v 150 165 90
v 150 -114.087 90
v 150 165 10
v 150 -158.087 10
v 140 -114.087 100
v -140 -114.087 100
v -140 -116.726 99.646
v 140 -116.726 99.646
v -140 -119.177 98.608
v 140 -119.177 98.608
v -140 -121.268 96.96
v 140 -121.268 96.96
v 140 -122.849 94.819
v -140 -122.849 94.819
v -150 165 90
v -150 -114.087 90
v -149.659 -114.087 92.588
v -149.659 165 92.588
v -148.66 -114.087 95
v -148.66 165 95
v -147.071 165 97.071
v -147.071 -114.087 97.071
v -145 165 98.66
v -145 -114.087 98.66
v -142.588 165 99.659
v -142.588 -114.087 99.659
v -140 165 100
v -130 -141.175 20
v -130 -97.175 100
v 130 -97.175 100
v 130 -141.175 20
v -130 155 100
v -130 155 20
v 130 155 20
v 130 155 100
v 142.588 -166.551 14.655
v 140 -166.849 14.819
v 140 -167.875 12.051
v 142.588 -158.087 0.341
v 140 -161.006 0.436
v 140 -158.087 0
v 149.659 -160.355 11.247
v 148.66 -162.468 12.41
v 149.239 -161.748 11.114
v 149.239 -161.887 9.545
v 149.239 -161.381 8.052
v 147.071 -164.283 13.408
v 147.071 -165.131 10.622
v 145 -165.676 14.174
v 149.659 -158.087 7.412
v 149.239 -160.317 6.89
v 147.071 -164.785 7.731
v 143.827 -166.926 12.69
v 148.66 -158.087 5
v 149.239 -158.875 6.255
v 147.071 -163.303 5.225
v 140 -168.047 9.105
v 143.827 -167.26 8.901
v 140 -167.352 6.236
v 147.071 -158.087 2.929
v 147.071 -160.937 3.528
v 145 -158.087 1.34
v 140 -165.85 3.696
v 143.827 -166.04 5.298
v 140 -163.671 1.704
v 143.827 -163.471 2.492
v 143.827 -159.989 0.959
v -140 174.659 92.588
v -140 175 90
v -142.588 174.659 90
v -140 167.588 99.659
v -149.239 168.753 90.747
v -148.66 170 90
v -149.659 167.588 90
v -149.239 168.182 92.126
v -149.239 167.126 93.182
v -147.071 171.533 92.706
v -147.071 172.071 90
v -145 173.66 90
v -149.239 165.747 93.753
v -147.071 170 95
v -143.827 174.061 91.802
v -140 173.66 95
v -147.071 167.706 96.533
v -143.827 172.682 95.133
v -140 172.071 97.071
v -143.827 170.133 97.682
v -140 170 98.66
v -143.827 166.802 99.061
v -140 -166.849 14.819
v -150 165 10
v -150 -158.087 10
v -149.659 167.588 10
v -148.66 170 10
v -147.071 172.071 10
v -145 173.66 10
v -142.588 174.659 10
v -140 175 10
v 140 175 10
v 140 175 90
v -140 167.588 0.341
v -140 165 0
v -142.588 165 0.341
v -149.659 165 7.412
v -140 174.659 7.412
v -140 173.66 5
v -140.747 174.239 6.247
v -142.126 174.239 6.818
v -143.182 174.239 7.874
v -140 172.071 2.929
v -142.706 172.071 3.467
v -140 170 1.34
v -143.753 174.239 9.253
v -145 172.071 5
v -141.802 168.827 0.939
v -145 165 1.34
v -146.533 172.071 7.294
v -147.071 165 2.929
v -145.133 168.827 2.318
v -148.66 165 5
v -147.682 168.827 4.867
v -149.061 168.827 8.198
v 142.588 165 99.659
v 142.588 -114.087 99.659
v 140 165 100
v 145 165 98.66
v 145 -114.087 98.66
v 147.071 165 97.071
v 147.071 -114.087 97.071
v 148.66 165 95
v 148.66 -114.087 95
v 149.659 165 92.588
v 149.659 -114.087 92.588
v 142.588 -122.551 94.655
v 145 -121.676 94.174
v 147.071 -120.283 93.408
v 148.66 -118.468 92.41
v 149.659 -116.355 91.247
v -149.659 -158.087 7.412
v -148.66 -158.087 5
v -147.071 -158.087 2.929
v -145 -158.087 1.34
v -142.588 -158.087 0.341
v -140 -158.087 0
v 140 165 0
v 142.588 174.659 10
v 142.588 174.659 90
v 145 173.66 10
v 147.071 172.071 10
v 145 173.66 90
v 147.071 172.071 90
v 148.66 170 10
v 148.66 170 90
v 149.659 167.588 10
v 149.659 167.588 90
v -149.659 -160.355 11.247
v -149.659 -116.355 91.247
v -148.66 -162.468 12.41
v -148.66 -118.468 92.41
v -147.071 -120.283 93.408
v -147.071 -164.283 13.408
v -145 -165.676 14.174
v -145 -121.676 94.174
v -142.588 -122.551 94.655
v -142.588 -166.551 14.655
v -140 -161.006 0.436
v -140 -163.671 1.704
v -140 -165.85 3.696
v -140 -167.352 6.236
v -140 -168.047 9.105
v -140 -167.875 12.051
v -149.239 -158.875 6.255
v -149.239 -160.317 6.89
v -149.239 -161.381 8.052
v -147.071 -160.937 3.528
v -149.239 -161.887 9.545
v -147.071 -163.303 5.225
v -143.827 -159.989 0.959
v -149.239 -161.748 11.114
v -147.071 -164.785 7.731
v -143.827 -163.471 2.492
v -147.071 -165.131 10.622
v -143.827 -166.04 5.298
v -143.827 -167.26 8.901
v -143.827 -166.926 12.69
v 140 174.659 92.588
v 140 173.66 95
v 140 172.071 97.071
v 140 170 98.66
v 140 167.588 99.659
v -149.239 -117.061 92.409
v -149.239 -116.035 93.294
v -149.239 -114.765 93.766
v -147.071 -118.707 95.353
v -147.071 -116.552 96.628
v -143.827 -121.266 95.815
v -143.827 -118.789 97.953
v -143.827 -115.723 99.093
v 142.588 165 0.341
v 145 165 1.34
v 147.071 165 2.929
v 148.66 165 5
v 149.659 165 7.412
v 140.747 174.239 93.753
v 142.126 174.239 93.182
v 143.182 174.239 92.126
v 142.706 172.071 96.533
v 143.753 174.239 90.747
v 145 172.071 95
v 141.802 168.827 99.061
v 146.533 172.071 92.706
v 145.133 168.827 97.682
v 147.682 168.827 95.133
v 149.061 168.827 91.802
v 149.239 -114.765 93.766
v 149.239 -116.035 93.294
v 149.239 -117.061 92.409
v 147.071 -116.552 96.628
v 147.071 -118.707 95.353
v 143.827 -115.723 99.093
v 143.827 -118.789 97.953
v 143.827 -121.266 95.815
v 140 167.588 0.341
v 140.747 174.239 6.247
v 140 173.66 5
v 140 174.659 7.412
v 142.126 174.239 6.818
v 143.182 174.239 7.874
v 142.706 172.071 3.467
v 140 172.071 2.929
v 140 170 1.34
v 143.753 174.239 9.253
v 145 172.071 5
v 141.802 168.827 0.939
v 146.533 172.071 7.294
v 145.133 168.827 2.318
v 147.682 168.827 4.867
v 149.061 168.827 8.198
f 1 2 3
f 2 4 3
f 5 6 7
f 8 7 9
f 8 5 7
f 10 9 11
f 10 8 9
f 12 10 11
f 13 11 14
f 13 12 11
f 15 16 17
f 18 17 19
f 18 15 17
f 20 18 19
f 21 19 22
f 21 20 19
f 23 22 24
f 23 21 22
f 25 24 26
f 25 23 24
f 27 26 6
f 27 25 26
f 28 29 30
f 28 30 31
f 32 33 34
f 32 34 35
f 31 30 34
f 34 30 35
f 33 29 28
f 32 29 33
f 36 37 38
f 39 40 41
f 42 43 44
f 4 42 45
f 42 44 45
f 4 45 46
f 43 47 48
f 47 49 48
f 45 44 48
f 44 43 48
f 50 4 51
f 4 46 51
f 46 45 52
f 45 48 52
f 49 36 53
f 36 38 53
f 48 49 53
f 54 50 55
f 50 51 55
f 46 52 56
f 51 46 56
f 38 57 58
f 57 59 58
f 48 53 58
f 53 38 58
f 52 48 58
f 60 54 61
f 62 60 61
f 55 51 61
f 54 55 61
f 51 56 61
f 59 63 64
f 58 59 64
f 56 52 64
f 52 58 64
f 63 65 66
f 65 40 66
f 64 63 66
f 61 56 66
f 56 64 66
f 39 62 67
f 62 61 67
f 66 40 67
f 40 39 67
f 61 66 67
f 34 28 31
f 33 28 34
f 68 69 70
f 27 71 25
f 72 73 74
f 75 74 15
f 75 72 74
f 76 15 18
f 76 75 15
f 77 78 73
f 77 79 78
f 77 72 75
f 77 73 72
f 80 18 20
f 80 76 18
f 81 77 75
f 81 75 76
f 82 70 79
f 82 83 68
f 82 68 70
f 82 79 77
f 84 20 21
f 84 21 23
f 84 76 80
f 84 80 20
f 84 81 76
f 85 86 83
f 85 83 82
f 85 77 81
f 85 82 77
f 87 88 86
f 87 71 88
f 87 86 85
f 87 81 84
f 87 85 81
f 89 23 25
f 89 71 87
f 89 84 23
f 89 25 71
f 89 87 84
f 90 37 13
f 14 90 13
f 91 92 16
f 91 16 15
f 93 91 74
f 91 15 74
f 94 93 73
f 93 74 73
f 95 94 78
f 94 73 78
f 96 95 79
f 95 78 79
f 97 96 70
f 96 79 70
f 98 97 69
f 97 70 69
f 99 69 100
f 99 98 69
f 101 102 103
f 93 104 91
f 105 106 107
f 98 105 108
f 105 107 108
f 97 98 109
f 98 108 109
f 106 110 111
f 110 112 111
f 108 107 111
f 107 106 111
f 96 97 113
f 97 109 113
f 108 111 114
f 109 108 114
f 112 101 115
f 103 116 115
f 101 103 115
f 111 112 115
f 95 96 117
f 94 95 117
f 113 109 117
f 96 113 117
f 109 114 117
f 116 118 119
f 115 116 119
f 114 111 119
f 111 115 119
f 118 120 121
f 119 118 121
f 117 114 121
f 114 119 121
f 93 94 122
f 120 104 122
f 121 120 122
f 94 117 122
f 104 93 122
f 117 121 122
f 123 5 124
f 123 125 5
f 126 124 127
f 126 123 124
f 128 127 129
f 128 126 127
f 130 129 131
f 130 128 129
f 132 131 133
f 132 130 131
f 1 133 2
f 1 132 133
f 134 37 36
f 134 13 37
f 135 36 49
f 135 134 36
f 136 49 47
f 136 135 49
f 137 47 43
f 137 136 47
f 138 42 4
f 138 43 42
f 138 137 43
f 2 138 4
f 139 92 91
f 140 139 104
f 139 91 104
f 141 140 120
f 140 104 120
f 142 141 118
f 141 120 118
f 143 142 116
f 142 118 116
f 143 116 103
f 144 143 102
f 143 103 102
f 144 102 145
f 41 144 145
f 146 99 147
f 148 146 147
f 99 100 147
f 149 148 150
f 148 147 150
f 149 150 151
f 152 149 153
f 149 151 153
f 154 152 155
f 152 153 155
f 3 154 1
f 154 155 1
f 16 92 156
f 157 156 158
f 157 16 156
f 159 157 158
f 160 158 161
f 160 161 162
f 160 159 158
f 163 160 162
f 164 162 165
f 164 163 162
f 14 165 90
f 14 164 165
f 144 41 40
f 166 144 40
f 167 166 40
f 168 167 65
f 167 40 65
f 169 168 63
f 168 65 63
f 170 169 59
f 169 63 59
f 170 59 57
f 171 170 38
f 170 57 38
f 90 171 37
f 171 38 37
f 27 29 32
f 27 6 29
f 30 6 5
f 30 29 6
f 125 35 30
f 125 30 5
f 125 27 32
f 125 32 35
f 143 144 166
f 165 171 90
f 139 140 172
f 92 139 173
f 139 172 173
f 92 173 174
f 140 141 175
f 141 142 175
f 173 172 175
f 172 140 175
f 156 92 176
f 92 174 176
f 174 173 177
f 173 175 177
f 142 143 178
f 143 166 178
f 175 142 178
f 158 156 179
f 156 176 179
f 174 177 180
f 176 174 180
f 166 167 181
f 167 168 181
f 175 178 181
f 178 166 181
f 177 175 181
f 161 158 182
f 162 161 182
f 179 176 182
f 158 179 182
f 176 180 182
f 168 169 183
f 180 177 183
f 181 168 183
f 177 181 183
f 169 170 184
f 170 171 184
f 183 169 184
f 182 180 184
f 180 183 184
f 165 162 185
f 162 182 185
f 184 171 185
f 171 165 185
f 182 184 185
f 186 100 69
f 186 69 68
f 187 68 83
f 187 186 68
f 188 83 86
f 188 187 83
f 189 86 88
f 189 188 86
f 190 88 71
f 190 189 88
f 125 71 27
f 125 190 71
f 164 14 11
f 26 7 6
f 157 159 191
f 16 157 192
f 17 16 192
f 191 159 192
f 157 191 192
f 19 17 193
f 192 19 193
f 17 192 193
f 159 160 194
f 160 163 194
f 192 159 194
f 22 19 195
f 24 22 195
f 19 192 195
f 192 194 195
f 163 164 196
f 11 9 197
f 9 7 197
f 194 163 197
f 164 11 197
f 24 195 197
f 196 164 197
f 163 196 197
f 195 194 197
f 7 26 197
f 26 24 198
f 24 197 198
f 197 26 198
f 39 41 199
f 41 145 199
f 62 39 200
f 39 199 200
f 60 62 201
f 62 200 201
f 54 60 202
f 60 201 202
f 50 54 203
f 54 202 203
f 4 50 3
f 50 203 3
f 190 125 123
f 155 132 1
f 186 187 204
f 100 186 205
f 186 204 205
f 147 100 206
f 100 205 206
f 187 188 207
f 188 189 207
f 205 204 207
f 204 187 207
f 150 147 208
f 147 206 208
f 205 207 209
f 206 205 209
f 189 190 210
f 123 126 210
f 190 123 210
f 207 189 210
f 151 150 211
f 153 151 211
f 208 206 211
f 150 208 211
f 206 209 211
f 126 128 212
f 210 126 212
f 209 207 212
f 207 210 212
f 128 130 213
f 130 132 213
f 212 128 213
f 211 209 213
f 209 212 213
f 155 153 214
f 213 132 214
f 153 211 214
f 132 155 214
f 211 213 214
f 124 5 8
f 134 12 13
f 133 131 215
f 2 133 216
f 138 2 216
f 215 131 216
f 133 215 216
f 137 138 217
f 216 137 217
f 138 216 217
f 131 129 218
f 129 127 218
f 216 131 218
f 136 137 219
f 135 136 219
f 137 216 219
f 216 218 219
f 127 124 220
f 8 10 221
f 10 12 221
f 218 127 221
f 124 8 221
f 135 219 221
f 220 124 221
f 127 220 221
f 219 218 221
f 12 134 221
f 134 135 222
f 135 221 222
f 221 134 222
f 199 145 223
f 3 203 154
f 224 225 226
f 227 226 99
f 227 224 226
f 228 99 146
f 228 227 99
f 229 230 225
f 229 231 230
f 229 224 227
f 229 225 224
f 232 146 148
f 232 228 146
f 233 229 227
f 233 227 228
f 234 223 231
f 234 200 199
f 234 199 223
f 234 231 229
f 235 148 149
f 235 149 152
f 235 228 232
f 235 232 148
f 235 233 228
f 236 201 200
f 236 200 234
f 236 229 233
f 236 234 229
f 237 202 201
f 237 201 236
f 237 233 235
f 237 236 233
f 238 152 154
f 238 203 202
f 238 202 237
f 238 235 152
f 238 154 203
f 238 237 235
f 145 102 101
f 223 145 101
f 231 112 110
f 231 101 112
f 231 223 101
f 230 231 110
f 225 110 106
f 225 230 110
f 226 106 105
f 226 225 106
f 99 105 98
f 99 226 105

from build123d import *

# Parameters (mm, degrees)
SKETCH1_W           = 300
SKETCH1_H           = 350
BOSS_EXTRUDE1_DEPTH = 100
CUT_EXTRUDE1_DEPTH  = 362.42080737
FILLET1_R           = 10
SHELL1_START        = -130
SHELL1_DEPTH        = 260


# Read off the part's stored shape, not the designer's step: Shell1
with BuildPart() as part:
    # Sketch1 → Boss-Extrude1 (new body)
    with BuildSketch(Plane.XY):
        Rectangle(SKETCH1_W, SKETCH1_H)
    extrude(amount=BOSS_EXTRUDE1_DEPTH)

    # Sketch2 → Cut-Extrude1 (cut, through all)
    with BuildSketch(Plane.ZY.offset(150)):
        Polygon((0, -175), (100, -120), (100, -175), align=None)
    extrude(amount=-CUT_EXTRUDE1_DEPTH, mode=Mode.SUBTRACT)

    # Fillet1
    fillet1_edges = [part.edges().sort_by_distance(p)[0] for p in [
        (150, 27.5, 100),
        (150, -147.5, 50),
        (0, -120, 100),
        (-150, -147.5, 50),
        (0, 175, 100),
        (150, 0, 0),
        (0, -175, 0),
        (-150, 0, 0),
        (0, 175, 0),
        (150, 175, 50),
        (-150, 175, 50),
        (-150, 27.5, 100),
    ]]
    fillet(fillet1_edges, radius=FILLET1_R)

    # Shell1 outline → Shell1 (cut)
    with BuildSketch(Plane.YZ.offset(SHELL1_START)):
        Polygon((155, 20), (155, 100), (-97.174575579, 100), (-141.174575579, 20), align=None)
    extrude(amount=SHELL1_DEPTH, mode=Mode.SUBTRACT)


solid = part.part
